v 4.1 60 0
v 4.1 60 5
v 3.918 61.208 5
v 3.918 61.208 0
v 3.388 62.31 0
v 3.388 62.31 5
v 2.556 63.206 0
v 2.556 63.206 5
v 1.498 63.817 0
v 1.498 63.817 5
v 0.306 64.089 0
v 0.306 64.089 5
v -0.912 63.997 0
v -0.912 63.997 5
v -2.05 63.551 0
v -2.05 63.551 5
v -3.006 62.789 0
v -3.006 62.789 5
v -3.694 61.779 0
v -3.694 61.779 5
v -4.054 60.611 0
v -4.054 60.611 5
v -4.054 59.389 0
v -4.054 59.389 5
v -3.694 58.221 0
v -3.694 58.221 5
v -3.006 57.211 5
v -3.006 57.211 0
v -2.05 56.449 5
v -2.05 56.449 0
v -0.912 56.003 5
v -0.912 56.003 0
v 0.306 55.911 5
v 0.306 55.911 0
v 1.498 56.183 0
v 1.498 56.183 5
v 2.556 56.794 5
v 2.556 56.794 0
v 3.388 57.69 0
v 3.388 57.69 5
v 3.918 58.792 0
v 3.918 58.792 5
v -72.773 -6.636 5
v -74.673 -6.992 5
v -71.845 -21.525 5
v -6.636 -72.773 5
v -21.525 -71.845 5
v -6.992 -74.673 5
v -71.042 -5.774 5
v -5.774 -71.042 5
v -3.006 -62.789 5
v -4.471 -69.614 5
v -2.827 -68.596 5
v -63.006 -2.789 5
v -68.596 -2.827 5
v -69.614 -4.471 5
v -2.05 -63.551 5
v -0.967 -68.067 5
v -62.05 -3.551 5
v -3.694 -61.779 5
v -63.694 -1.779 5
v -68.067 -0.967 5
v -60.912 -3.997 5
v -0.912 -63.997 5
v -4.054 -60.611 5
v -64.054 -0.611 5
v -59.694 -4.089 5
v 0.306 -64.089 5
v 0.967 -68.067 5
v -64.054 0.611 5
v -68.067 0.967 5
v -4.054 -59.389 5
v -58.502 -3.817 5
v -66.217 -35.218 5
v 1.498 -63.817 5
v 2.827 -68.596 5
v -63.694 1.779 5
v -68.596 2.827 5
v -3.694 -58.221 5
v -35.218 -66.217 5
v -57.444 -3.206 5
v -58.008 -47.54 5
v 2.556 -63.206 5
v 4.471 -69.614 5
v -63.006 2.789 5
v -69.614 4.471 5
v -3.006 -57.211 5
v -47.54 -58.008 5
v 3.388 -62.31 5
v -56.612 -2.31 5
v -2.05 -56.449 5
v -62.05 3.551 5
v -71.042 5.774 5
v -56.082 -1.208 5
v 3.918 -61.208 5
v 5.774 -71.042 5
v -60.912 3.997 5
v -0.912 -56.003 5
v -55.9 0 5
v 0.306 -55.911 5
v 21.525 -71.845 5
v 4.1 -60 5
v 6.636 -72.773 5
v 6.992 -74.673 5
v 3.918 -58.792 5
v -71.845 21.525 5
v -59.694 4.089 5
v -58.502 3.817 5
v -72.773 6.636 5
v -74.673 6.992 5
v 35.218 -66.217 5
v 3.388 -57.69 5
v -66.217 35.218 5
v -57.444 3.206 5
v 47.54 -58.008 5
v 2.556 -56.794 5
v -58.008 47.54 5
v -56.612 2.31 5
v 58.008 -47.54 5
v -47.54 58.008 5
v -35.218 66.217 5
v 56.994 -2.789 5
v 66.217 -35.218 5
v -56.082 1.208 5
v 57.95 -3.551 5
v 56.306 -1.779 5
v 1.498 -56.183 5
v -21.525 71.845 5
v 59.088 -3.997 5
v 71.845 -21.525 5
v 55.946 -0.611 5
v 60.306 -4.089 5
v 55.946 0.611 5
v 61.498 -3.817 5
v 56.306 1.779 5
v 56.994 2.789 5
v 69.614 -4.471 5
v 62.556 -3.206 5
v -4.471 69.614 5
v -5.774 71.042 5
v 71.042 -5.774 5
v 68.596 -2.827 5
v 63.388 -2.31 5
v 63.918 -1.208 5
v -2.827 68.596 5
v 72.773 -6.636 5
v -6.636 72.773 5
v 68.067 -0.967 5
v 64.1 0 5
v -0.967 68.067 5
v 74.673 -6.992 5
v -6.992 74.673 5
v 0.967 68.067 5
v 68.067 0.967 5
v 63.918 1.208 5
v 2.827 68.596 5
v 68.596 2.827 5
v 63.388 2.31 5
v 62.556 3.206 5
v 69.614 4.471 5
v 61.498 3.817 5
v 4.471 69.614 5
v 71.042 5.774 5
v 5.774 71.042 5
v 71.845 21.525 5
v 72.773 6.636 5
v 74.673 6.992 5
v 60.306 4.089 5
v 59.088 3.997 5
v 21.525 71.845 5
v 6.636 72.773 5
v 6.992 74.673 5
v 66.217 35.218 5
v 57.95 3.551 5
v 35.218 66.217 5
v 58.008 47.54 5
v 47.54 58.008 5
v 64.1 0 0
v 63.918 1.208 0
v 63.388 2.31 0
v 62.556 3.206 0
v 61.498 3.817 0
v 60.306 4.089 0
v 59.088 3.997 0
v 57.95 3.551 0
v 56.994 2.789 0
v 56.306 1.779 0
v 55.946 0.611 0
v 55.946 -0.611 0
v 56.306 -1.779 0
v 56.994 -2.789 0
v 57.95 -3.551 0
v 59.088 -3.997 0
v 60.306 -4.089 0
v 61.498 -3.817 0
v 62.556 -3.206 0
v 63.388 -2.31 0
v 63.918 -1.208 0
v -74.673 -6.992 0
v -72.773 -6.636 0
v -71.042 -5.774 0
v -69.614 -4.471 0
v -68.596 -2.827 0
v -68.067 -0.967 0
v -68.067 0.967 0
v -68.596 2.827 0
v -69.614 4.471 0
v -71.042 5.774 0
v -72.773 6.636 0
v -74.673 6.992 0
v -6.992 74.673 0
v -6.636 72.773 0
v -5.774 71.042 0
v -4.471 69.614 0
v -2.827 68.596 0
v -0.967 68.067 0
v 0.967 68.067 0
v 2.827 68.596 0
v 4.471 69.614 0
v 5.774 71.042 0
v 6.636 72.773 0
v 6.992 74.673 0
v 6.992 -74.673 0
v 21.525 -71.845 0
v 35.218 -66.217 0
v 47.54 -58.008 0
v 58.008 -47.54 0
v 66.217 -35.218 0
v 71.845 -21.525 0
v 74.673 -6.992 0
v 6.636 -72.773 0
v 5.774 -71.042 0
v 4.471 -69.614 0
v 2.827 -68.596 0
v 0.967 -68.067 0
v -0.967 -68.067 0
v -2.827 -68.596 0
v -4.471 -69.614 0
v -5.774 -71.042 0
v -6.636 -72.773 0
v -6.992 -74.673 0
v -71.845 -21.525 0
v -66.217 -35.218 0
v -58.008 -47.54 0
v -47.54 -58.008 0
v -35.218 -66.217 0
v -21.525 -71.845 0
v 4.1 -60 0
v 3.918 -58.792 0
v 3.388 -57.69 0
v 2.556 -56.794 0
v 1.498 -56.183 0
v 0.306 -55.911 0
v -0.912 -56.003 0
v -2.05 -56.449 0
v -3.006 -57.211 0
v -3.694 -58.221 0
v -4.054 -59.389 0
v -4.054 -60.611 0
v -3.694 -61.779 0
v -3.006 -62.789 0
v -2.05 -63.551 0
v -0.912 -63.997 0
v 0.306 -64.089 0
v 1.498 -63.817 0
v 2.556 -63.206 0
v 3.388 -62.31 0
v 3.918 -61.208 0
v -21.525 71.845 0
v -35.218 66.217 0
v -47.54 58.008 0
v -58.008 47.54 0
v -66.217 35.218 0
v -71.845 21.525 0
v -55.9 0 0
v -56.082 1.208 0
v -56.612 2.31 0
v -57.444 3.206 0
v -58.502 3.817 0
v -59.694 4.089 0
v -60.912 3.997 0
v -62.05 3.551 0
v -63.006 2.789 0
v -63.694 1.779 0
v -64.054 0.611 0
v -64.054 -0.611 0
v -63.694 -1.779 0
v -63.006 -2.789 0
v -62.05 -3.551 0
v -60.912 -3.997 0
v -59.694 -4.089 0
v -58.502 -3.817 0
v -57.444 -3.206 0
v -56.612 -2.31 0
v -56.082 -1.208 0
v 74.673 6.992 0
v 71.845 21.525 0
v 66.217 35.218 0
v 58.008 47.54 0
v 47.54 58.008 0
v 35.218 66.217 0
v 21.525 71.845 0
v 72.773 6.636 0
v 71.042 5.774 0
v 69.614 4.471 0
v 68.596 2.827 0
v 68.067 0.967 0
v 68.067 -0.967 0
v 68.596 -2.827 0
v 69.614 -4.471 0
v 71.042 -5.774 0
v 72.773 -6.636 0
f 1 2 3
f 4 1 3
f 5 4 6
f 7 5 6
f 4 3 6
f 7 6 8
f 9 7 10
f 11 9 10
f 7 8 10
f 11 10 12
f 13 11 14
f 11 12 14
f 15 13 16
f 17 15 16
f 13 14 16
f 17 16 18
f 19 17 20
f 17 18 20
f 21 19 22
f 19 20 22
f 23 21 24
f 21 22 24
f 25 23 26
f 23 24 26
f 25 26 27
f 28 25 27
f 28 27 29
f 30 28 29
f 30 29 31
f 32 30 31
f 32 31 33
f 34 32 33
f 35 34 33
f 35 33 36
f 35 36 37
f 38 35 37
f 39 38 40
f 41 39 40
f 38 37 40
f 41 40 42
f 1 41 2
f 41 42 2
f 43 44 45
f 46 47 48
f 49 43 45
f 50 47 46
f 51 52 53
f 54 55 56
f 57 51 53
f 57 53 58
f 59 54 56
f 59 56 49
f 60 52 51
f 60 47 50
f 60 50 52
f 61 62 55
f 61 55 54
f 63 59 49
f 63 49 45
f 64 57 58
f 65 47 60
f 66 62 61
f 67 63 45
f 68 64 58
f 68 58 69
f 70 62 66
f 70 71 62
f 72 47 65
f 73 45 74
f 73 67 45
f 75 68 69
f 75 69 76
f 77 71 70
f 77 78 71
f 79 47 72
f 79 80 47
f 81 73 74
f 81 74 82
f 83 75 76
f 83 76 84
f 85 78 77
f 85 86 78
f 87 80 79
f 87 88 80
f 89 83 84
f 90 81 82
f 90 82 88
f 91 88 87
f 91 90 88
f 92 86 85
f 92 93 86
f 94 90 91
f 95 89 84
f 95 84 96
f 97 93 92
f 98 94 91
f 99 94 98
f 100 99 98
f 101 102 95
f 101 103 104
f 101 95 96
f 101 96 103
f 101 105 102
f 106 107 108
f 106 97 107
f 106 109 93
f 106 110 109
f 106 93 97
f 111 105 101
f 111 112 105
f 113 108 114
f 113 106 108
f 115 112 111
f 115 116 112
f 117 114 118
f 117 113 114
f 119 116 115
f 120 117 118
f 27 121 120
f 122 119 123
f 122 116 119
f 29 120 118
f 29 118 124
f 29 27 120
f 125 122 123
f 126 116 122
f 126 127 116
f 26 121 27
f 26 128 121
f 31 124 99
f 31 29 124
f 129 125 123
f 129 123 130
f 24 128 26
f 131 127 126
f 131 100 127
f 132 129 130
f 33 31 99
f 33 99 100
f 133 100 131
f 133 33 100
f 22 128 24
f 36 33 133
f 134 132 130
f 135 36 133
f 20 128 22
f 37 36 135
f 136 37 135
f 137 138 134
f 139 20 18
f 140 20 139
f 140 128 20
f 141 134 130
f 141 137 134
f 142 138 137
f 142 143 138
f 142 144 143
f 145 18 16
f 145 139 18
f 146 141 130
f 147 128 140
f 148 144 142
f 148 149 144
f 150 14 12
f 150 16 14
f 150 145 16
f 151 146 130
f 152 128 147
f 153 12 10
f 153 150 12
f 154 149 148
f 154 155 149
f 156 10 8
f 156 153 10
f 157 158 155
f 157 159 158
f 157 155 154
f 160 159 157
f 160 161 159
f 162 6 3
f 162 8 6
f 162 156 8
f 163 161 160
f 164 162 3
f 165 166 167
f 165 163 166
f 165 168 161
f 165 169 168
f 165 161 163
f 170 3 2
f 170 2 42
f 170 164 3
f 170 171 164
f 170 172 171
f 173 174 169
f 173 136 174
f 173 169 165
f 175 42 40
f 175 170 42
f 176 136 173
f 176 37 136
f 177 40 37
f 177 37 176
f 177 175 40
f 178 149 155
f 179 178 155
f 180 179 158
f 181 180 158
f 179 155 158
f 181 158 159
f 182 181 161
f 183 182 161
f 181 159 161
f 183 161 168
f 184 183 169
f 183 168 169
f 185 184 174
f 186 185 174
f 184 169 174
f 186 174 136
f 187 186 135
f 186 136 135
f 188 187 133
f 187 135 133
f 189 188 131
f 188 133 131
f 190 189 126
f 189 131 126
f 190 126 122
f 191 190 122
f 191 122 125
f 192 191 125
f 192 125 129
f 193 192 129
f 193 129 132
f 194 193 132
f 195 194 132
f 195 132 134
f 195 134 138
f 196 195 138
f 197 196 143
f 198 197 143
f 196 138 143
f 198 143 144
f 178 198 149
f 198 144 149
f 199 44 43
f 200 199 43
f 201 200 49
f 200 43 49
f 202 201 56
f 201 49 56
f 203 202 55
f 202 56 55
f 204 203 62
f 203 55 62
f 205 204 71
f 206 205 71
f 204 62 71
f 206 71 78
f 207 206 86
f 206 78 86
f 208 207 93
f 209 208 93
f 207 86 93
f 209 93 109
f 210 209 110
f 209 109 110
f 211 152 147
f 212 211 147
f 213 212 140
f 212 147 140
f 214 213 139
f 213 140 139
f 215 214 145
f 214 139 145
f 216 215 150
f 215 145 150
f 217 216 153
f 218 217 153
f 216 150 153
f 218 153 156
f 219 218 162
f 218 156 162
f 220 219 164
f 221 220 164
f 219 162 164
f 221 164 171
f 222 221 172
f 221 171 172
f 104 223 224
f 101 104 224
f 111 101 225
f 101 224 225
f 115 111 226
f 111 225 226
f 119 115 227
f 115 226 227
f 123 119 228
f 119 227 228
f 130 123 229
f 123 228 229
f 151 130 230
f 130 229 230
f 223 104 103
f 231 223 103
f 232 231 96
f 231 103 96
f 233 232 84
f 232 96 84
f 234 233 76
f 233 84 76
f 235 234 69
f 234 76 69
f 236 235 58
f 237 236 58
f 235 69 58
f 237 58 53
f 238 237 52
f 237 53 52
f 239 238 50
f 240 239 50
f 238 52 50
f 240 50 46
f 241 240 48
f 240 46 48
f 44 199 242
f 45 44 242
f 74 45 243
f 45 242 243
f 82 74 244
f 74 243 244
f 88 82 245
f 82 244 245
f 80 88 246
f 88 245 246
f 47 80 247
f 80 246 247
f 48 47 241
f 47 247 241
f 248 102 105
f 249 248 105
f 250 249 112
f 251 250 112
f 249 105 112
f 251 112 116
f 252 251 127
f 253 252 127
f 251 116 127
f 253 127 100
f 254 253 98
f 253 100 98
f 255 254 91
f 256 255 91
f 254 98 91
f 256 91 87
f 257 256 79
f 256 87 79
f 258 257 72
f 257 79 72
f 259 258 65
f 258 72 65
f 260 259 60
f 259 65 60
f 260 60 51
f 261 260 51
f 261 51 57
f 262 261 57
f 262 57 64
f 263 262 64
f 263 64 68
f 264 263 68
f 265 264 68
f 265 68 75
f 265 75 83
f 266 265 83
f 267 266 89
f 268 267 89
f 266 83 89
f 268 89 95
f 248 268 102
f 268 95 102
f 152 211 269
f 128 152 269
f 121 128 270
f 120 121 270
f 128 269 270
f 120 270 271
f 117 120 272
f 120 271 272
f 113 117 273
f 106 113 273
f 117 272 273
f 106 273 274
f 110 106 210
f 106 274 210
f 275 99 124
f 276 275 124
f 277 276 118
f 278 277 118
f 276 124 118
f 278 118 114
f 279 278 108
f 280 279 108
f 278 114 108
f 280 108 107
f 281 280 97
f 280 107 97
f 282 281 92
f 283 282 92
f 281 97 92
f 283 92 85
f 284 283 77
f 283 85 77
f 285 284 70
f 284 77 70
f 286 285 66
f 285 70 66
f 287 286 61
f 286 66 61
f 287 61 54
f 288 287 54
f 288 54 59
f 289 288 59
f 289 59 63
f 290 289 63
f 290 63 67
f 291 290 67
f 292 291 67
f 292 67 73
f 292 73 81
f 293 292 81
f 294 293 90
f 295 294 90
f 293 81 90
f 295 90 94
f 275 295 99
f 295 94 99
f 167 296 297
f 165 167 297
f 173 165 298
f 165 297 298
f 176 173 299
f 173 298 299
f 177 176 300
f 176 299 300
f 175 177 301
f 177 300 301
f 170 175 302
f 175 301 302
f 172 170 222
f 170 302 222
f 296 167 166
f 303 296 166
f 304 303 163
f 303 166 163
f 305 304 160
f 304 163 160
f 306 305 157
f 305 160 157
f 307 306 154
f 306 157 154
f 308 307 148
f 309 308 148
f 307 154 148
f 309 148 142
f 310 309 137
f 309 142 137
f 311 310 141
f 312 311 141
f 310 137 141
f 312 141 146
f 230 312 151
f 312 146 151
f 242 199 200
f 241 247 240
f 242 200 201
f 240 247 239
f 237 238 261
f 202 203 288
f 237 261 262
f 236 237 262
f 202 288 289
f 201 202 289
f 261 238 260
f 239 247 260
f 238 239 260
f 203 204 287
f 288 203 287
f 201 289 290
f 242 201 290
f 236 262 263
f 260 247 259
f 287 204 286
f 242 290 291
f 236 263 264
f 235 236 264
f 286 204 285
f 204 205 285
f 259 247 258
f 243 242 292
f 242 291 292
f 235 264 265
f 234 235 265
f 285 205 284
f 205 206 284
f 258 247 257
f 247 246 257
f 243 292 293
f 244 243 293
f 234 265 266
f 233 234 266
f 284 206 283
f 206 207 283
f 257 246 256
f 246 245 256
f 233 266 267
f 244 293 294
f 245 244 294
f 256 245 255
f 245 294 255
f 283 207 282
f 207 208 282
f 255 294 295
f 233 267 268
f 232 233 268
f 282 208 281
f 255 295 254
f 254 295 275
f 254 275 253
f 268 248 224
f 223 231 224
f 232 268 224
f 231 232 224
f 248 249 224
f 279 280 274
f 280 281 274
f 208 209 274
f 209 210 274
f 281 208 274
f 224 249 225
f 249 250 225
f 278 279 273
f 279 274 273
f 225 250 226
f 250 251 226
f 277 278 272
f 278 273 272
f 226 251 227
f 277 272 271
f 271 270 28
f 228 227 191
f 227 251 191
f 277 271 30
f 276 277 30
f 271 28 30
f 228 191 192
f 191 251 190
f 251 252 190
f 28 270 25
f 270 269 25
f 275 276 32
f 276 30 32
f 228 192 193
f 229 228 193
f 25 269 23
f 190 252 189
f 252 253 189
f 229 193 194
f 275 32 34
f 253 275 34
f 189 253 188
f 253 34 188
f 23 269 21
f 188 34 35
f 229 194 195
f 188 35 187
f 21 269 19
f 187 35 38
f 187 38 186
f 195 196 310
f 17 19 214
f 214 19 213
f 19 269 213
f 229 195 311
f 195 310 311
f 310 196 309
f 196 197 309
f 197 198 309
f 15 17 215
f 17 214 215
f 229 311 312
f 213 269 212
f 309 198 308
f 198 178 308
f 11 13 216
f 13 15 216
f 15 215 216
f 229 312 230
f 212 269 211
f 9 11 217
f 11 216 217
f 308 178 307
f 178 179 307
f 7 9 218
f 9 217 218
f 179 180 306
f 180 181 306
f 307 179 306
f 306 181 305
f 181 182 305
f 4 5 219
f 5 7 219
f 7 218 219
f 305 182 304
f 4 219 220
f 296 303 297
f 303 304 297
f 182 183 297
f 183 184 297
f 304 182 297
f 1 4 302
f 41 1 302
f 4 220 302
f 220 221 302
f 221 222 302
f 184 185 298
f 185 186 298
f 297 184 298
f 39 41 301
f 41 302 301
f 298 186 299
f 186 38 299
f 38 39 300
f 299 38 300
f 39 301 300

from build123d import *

# Parameters (mm, degrees)
F0_R     = 75
F1_DEPTH = 5
F2_R     = 4.1
F3_DEPTH = 5


with BuildPart() as f1:
    # F0 (on Top) → F1 (new body)
    with BuildSketch(Plane.XY):
        Circle(F0_R)
    extrude(amount=F1_DEPTH)

    # F2 (on face) → F3 (cut, through all)
    with BuildSketch(Plane.XY.offset(5)):
        with Locations((0, 60)):
            Circle(F2_R)
        with Locations((60, 0)):
            Circle(F2_R)
        with Locations((0, -60)):
            Circle(F2_R)
        with Locations((-60, 0)):
            Circle(F2_R)
        with BuildLine():
            ThreePointArc((74.673333, -6.992374), (75, 0), (74.673333, 6.992374))
            ThreePointArc((74.673333, 6.992374), (68, 0), (74.673333, -6.992374))
        make_face()
        with BuildLine():
            ThreePointArc((-6.992374, 74.673333), (0, 68), (6.992374, 74.673333))
            ThreePointArc((6.992374, 74.673333), (0, 75), (-6.992374, 74.673333))
        make_face()
        with BuildLine():
            ThreePointArc((-74.673333, -6.992374), (-68, 0), (-74.673333, 6.992374))
            ThreePointArc((-74.673333, 6.992374), (-75, 0), (-74.673333, -6.992374))
        make_face()
        with BuildLine():
            ThreePointArc((6.992374, -74.673333), (0, -68), (-6.992374, -74.673333))
            ThreePointArc((-6.992374, -74.673333), (0, -75), (6.992374, -74.673333))
        make_face()
    extrude(amount=-F3_DEPTH, mode=Mode.SUBTRACT)


solid = f1.part
